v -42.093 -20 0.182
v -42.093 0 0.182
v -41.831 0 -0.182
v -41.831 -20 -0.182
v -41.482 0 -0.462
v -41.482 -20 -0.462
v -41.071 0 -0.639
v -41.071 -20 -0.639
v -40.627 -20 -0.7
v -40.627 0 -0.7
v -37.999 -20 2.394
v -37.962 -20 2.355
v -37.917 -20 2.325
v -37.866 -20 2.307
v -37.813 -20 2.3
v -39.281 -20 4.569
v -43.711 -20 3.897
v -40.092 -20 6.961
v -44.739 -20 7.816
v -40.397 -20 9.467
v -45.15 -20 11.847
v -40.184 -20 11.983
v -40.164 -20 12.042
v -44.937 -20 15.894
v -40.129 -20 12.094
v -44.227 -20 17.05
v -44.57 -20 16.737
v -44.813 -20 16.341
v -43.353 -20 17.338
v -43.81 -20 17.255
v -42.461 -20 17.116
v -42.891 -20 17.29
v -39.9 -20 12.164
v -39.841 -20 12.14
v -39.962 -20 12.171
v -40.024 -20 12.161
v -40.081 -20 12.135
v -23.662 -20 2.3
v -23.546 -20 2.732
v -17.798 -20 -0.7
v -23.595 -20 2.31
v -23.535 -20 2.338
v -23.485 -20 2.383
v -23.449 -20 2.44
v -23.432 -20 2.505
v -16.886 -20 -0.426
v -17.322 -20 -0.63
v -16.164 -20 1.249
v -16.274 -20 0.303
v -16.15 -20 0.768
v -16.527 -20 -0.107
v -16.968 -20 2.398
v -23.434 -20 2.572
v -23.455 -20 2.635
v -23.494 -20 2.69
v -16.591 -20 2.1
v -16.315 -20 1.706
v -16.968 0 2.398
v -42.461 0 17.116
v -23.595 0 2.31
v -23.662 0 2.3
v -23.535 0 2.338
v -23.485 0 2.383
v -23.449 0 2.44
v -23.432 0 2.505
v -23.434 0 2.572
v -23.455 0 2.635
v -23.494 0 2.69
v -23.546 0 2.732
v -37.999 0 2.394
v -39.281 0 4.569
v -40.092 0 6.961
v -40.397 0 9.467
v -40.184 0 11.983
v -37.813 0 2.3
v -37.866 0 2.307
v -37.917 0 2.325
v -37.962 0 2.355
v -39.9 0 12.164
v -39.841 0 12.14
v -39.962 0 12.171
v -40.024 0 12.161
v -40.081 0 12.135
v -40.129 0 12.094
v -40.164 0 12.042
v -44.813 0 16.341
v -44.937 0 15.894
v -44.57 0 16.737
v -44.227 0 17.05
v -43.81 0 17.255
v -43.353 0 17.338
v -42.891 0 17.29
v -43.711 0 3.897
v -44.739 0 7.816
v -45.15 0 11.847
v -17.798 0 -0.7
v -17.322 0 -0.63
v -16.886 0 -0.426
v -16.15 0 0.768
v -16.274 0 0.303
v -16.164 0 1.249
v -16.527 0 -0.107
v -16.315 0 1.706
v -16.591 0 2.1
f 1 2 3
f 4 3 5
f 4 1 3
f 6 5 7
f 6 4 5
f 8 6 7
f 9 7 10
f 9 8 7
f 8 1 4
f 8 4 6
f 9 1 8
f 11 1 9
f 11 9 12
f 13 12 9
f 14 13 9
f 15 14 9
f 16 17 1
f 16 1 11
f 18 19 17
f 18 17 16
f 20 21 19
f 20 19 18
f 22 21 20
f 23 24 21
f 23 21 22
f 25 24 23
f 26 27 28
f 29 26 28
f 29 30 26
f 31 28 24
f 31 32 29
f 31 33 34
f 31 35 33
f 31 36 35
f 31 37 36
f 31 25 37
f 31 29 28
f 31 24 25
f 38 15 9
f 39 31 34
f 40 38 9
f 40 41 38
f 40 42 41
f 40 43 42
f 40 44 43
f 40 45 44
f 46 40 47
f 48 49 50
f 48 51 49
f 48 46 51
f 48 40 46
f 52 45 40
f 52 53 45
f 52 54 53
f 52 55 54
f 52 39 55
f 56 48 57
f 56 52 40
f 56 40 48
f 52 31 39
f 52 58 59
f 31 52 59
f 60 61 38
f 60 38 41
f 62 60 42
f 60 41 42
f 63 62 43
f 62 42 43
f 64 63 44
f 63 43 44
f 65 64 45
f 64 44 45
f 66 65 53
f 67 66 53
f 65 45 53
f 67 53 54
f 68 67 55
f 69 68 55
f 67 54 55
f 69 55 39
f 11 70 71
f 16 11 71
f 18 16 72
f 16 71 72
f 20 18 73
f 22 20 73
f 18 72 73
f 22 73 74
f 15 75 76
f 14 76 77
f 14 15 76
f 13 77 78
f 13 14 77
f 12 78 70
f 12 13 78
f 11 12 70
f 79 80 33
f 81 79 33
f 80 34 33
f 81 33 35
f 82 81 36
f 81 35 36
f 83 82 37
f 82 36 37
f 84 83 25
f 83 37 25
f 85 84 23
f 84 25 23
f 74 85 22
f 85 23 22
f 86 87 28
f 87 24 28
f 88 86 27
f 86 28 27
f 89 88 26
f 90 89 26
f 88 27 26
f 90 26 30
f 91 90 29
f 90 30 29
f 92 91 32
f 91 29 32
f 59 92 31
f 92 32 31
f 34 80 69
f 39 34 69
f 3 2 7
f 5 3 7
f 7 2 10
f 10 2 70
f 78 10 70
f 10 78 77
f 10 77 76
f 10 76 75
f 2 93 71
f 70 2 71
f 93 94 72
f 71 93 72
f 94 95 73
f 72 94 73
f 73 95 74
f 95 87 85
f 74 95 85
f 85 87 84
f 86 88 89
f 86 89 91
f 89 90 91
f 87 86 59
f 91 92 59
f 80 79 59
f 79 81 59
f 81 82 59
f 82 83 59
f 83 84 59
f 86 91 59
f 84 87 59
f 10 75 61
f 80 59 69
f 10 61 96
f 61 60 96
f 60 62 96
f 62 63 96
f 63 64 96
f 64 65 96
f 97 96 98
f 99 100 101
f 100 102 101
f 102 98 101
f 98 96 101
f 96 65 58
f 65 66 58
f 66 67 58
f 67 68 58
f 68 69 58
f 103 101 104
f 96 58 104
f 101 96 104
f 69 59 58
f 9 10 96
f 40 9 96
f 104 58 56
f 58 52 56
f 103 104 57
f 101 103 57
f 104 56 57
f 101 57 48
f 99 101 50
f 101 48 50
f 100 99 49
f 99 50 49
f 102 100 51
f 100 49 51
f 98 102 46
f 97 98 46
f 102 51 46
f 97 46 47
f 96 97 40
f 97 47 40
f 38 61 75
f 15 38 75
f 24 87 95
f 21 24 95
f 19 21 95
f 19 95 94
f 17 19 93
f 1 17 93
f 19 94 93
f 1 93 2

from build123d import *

# Parameters (mm, degrees)
F1_DEPTH = 20
F2_R     = 1.6600926706
F3_R     = 0.231152144


with BuildPart() as f1:
    # F0 (on Front) → F1 (new body)
    with BuildSketch(Plane.XZ):
        with BuildLine():
            ThreePointArc((-44.5080057804, 18.2982461622), (-44.856766986, 8.5238854869), (-41.6028533709, -0.6995524392))
            Line((-41.6028533709, -0.6995524392), (-11.6028533709, -0.6995524392))
            Line((-11.6028533709, -0.6995524392), (-44.5080057804, 18.2982461622))
        make_face()
        with BuildLine():
            ThreePointArc((-37.9288420081, 2.3004475608), (-40.1145449825, 7.0615839207), (-40.1195138693, 12.3004475608))
            Line((-40.1195138693, 12.3004475608), (-22.7990057936, 2.3004475608))
            Line((-22.7990057936, 2.3004475608), (-37.9288420081, 2.3004475608))
        make_face(mode=Mode.SUBTRACT)
    extrude(amount=F1_DEPTH)

    # F2
    f2_edges = [f1.edges().sort_by_distance(p)[0] for p in [
        (-11.602853, -10, -0.699552),
        (-44.508006, -10, 18.298246),
        (-41.602853, -10, -0.699552),
    ]]
    fillet(f2_edges, radius=F2_R)

    # F3
    f3_edges = [f1.edges().sort_by_distance(p)[0] for p in [
        (-22.799006, -10, 2.300448),
        (-37.928842, -10, 2.300448),
        (-40.119514, -10, 12.300448),
    ]]
    fillet(f3_edges, radius=F3_R)


solid = f1.part
